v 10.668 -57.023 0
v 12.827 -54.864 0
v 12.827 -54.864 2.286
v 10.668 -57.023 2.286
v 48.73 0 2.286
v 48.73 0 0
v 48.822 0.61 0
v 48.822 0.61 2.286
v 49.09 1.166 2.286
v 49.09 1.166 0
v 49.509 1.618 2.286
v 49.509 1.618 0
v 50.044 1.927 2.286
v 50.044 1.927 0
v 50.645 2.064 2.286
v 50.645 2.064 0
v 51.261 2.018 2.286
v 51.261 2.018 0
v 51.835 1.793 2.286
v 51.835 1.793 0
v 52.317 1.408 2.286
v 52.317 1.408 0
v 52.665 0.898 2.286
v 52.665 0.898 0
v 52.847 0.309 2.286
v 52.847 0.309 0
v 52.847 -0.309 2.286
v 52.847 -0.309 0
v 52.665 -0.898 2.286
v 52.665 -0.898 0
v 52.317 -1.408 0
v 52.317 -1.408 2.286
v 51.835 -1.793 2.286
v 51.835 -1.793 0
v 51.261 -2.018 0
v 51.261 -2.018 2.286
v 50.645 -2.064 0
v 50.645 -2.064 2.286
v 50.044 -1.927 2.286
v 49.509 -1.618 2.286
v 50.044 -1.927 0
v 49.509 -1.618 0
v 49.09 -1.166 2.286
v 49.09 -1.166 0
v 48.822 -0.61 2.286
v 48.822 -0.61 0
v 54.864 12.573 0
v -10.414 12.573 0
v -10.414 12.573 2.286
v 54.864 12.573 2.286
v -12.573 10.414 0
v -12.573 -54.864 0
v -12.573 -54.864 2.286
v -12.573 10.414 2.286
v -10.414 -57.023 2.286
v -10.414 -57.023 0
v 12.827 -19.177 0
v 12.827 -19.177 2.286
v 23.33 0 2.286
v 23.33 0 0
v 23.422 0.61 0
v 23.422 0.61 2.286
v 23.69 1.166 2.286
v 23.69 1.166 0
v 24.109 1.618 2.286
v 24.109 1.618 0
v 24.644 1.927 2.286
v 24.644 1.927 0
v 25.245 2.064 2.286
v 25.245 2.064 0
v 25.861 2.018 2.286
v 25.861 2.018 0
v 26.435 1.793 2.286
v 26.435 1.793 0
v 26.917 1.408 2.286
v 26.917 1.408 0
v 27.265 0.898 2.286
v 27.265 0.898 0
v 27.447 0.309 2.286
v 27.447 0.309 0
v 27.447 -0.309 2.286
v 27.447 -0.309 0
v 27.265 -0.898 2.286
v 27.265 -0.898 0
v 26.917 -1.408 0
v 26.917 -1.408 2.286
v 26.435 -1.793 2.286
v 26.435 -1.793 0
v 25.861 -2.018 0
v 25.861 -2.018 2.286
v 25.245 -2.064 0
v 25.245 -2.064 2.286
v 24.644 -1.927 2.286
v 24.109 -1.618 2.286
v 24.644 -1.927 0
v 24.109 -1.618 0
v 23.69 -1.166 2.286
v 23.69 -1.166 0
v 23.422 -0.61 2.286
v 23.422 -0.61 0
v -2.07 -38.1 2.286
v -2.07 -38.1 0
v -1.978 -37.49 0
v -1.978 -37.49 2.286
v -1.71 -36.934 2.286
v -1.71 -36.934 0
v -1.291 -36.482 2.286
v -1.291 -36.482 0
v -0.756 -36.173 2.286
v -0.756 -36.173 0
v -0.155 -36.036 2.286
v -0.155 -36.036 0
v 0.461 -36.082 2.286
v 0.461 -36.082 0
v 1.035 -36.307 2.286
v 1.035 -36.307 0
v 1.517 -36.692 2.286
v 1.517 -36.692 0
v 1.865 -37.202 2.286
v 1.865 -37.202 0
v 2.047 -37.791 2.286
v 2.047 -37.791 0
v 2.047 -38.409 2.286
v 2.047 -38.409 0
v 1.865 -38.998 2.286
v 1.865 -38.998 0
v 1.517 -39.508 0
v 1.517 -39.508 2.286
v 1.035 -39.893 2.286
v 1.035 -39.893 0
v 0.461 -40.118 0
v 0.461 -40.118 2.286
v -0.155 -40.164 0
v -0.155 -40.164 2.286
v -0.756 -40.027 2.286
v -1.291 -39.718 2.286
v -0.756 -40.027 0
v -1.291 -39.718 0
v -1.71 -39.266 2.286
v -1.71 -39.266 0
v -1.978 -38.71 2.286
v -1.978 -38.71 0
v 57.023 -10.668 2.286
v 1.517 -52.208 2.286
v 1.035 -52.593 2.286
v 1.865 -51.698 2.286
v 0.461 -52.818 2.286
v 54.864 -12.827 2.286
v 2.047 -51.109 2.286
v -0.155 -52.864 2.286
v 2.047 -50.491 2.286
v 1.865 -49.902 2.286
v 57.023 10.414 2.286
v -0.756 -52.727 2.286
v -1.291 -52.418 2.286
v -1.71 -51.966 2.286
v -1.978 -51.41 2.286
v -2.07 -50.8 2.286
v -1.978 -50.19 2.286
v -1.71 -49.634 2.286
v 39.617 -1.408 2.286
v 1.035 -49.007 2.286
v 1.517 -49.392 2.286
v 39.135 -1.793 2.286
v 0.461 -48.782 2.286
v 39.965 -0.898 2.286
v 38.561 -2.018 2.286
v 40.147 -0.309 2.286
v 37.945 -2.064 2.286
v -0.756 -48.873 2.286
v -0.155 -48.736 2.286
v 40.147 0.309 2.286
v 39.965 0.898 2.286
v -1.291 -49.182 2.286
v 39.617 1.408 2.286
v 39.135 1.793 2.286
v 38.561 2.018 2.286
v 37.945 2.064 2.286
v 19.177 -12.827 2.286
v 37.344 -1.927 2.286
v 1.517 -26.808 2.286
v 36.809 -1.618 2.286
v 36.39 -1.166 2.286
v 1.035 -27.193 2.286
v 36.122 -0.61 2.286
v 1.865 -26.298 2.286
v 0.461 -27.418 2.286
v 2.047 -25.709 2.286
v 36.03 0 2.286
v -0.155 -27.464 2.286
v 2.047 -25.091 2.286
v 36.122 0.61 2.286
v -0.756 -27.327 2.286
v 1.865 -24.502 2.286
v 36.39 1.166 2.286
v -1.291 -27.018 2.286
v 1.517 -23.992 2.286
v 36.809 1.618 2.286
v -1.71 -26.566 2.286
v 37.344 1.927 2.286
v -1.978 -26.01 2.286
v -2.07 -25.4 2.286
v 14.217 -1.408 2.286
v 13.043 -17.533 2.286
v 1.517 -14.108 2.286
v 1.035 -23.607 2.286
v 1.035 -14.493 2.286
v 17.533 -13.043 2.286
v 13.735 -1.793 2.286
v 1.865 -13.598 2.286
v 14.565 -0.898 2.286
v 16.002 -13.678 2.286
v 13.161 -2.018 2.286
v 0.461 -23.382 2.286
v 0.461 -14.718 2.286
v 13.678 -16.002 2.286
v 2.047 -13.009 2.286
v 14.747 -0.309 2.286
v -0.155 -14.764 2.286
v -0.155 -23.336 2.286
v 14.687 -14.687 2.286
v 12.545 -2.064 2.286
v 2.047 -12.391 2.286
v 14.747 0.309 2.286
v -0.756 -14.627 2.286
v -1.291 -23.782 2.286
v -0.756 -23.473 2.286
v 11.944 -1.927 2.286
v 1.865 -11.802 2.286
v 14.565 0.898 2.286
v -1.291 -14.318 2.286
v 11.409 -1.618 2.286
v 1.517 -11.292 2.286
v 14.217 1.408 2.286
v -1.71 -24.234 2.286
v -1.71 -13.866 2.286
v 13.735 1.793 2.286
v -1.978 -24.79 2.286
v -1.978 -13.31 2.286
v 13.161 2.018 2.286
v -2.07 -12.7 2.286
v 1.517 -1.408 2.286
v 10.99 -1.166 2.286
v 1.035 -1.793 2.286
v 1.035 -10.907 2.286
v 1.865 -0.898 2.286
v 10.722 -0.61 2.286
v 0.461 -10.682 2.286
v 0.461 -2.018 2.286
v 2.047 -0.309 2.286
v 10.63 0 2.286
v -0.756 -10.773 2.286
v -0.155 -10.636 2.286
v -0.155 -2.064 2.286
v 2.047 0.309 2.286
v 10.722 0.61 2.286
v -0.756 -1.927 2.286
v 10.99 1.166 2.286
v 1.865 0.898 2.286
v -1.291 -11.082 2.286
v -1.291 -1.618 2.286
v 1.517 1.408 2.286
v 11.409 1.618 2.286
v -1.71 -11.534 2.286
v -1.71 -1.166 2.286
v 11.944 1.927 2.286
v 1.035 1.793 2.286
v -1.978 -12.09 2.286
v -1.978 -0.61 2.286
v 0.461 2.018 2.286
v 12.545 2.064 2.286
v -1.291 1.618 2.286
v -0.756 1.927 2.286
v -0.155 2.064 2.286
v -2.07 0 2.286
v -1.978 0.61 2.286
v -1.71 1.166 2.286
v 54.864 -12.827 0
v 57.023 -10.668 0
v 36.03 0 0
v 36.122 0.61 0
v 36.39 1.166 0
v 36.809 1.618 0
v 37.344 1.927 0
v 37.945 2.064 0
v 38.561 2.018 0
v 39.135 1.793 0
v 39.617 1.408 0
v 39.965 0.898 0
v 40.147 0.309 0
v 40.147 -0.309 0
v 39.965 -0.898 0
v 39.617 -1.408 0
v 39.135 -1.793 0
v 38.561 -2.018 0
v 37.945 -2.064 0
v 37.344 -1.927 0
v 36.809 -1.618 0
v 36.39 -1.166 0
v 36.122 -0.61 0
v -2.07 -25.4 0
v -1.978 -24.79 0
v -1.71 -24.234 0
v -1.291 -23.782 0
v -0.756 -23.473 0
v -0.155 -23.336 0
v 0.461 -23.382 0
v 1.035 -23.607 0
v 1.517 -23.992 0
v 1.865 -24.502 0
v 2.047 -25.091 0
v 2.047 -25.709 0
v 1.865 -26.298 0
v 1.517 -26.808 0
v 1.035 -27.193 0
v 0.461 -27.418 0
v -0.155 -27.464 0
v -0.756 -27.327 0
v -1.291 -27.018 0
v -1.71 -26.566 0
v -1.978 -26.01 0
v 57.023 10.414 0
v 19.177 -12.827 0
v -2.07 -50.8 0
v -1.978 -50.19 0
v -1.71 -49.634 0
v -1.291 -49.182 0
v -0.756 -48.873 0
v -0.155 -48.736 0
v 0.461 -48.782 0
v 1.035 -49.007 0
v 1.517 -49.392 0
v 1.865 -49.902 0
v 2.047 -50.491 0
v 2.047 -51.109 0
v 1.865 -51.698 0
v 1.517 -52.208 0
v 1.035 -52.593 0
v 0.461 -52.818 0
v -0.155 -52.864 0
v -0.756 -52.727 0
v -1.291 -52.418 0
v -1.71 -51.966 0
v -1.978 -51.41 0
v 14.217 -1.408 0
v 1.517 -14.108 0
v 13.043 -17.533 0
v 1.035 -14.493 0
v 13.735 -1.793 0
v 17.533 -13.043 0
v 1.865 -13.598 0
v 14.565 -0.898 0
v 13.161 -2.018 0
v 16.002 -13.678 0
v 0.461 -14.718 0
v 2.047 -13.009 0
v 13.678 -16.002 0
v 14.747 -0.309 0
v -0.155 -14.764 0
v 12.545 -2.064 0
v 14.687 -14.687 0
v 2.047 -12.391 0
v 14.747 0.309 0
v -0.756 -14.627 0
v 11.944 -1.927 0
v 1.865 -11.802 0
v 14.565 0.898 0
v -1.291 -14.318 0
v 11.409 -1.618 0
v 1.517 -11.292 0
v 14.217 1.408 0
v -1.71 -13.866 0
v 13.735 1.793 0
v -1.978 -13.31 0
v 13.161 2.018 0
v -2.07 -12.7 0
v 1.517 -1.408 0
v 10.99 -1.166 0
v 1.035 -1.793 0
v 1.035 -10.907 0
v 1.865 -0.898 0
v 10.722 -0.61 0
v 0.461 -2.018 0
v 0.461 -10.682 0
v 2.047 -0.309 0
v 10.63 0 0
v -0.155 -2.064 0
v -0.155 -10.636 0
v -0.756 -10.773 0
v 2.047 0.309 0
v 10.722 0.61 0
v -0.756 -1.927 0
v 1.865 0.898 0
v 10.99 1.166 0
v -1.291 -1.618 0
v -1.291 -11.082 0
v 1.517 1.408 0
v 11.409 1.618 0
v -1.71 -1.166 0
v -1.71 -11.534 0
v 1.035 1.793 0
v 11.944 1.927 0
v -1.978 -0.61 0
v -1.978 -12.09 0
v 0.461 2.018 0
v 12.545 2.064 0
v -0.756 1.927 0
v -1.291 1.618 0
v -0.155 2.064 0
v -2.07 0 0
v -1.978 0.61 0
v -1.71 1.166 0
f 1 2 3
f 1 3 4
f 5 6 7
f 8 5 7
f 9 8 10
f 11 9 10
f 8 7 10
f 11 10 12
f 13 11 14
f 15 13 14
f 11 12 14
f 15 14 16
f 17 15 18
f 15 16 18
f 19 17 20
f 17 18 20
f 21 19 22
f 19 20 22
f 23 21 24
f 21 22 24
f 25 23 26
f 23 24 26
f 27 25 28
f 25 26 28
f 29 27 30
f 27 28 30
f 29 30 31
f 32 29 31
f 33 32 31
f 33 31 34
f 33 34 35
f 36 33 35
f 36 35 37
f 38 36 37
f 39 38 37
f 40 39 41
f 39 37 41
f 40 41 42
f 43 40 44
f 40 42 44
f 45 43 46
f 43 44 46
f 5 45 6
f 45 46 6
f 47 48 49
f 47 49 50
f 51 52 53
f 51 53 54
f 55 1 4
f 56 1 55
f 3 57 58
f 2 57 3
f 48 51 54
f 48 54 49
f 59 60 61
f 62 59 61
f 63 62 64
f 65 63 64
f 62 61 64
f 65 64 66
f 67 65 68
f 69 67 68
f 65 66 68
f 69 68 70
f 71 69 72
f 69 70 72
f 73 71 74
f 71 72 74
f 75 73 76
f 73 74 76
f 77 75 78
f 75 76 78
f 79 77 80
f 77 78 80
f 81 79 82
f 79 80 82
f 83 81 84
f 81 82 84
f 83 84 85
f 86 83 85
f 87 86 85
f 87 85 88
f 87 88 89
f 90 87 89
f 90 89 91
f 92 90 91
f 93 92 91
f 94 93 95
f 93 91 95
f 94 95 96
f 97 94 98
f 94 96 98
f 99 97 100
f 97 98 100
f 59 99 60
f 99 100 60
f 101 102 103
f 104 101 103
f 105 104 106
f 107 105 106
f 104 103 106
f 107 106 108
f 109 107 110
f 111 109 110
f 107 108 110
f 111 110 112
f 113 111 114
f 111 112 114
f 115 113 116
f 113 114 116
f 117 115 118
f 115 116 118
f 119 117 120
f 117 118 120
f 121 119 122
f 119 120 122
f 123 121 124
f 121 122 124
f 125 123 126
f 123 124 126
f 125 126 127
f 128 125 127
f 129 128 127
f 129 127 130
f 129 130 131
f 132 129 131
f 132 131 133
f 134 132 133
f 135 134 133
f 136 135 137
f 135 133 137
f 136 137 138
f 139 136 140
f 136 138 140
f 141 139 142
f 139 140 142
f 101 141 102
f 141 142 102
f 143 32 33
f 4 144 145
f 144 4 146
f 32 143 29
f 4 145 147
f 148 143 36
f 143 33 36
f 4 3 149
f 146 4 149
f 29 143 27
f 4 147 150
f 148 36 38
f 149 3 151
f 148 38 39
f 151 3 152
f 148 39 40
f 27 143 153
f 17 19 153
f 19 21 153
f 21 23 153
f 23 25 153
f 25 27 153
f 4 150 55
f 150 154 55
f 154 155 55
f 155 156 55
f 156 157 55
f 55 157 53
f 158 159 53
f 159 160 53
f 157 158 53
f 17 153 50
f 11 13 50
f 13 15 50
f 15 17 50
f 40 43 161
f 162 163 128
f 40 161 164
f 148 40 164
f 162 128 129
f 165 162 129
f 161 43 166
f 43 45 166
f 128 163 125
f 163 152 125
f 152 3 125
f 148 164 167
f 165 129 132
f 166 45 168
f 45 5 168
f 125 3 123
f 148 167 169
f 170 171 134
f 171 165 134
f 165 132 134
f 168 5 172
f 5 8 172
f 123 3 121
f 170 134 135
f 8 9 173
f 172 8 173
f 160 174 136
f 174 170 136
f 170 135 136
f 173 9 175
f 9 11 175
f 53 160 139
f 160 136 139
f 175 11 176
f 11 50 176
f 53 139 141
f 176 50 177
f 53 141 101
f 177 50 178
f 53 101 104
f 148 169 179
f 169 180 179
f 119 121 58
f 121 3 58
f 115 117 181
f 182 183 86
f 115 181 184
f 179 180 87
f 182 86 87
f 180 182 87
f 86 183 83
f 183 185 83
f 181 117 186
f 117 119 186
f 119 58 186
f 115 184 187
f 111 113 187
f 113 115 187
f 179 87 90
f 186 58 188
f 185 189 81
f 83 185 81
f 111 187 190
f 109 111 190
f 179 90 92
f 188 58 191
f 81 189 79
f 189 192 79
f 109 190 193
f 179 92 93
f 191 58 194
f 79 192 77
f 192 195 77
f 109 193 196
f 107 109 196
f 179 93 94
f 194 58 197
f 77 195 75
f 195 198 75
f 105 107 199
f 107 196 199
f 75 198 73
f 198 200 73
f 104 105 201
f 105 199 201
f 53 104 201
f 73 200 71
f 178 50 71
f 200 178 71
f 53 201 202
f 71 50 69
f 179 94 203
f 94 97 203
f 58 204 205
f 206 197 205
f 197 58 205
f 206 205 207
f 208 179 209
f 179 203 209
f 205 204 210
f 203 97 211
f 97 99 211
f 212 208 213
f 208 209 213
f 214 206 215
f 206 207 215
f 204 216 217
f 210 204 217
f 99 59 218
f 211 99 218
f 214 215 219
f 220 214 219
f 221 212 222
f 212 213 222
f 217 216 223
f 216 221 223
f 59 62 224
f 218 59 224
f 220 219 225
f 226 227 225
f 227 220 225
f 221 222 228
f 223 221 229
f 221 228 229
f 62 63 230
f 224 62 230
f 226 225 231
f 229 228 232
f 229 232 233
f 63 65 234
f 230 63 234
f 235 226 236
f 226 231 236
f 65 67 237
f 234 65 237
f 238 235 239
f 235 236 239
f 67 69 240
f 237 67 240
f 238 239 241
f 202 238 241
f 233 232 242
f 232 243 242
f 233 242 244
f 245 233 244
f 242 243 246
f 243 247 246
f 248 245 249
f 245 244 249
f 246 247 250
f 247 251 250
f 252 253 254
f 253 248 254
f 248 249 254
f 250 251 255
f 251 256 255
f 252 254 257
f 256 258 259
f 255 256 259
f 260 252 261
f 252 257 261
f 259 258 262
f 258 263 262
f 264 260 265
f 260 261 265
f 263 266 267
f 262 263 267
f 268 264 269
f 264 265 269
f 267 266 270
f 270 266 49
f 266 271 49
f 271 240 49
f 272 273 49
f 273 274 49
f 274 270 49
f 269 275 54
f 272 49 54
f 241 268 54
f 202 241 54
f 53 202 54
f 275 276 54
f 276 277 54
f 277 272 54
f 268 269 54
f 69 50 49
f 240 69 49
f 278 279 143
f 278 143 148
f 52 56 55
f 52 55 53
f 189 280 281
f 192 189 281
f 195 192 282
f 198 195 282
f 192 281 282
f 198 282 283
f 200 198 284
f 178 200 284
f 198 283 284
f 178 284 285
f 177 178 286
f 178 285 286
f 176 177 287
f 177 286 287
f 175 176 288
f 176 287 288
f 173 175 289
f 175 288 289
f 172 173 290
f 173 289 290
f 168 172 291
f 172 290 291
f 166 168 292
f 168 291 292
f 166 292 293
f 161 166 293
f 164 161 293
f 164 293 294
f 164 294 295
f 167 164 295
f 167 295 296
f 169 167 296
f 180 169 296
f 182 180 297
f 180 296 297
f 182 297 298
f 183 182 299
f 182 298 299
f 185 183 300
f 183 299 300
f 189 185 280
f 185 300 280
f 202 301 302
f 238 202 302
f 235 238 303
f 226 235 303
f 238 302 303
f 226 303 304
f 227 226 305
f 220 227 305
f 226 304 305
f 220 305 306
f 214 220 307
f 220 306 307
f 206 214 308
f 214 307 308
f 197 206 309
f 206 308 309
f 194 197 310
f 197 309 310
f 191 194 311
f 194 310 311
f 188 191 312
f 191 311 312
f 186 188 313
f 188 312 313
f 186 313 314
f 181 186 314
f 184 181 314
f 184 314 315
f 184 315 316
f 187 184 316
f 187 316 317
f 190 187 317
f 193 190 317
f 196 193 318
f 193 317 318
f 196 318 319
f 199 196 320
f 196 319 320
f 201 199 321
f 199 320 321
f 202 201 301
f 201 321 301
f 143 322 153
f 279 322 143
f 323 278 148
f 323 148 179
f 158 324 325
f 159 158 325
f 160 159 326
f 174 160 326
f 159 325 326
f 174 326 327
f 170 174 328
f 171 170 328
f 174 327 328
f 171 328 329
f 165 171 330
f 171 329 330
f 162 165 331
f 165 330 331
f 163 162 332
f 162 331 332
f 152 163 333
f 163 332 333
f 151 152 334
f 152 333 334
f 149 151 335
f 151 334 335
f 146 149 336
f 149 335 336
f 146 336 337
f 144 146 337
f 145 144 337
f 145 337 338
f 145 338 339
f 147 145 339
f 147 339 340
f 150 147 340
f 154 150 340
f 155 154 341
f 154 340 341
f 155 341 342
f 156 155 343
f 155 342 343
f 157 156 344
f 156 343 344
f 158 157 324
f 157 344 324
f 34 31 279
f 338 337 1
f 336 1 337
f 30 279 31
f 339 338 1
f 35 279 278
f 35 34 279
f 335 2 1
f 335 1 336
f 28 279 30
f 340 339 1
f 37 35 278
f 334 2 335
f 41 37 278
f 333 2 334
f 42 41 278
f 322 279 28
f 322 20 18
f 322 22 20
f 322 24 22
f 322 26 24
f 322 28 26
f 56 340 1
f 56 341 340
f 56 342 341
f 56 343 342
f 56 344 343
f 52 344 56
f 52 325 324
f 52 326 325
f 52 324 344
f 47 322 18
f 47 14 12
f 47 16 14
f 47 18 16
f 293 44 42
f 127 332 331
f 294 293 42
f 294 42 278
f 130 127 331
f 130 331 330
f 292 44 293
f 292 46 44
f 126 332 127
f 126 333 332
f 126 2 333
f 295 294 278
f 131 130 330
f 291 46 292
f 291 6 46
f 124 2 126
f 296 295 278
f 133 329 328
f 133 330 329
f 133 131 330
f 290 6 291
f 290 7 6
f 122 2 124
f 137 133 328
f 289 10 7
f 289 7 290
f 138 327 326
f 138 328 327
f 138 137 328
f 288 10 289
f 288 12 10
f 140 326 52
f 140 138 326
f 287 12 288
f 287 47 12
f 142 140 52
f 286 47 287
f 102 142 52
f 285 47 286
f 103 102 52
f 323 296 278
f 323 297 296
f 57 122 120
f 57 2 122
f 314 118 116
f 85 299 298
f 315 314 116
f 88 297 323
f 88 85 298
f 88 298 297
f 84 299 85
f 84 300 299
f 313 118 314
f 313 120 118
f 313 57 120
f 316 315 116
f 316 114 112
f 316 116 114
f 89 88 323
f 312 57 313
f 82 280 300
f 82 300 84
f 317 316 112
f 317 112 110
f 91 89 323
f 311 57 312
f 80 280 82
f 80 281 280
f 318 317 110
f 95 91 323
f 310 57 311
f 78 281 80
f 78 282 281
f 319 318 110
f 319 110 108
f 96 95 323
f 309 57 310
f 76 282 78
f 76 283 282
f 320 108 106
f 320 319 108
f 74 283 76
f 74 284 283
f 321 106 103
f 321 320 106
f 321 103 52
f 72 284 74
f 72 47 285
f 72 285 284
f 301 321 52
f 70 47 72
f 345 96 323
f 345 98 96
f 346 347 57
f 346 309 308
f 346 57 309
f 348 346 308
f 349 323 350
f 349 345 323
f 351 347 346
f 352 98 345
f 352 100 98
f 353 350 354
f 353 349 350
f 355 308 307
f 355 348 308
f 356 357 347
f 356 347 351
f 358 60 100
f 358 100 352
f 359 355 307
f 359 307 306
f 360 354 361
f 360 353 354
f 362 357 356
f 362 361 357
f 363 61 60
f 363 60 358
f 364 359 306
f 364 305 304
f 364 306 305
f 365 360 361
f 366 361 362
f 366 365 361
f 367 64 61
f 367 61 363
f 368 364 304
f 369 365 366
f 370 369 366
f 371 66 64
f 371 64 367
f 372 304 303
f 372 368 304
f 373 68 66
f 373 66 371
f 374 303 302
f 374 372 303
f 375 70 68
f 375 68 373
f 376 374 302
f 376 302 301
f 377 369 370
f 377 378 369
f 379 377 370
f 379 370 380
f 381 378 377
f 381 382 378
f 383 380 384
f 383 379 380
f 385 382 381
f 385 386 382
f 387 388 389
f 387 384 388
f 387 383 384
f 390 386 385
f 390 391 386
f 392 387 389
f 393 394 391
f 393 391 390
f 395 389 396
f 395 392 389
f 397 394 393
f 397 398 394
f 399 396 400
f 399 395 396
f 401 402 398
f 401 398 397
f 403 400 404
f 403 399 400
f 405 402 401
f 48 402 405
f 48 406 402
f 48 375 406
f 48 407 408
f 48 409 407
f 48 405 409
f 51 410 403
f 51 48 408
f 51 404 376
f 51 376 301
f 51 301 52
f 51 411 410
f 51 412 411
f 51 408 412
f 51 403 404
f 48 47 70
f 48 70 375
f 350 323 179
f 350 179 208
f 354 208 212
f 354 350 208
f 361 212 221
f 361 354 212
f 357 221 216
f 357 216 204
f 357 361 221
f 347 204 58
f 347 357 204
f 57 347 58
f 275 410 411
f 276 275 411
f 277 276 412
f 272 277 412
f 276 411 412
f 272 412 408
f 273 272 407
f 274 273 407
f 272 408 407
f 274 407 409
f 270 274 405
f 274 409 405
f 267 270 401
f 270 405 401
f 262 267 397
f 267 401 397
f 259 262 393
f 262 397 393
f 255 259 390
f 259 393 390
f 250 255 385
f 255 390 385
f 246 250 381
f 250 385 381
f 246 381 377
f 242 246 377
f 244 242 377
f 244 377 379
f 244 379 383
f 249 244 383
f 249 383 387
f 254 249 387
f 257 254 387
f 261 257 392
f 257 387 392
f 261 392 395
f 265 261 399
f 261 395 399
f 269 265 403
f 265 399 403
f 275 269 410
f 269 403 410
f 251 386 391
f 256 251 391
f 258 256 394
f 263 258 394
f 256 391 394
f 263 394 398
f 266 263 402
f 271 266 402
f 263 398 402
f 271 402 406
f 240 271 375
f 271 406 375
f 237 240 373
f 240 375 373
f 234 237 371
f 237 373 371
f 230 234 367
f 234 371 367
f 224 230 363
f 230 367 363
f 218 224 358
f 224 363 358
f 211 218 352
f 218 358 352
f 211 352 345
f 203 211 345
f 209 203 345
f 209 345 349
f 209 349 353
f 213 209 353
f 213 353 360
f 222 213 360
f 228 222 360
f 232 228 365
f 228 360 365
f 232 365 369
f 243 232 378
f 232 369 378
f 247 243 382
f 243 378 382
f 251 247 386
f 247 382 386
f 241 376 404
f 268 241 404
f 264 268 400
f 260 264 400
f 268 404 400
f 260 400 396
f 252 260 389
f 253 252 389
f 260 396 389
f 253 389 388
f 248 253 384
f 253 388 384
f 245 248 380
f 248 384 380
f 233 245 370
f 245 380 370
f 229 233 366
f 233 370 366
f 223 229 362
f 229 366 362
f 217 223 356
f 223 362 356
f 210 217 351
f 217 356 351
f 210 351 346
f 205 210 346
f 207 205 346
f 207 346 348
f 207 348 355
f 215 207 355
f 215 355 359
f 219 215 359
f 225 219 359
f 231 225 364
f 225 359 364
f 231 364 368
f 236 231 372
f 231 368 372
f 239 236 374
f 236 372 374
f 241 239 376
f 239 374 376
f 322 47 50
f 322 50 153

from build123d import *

# Parameters (mm, degrees)
SKETCH1_R           = 2.0701
BOSS_EXTRUDE1_DEPTH = 2.286


with BuildPart() as part:
    # Sketch1 → Boss-Extrude1 (new body)
    with BuildSketch(Plane(origin=(0, 0, 0), x_dir=(-1, 0, 0), z_dir=(0, 0, -1))):
        with BuildLine():
            Line((10.414, 12.573), (-54.864, 12.573))
            Line((-54.864, 12.573), (-57.023, 10.414))
            Line((-57.023, 10.414), (-57.023, -10.668))
            Line((-57.023, -10.668), (-54.864, -12.827))
            Line((-54.864, -12.827), (-19.177, -12.827))
            ThreePointArc((-19.177, -12.827), (-14.686871939, -14.686871939), (-12.827, -19.177))
            Line((-12.827, -19.177), (-12.827, -54.864))
            Line((-12.827, -54.864), (-10.668, -57.023))
            Line((-10.668, -57.023), (10.414, -57.023))
            Line((10.414, -57.023), (12.573, -54.864))
            Line((12.573, -54.864), (12.573, 10.414))
            Line((12.573, 10.414), (10.414, 12.573))
        make_face()
        with Locations((0, -50.8)):
            Circle(SKETCH1_R, mode=Mode.SUBTRACT)
        with Locations((0, -25.4)):
            Circle(SKETCH1_R, mode=Mode.SUBTRACT)
        with Locations((-38.1, 0)):
            Circle(SKETCH1_R, mode=Mode.SUBTRACT)
        with Locations((-12.7, 0)):
            Circle(SKETCH1_R, mode=Mode.SUBTRACT)
        Circle(SKETCH1_R, mode=Mode.SUBTRACT)
        with Locations((-25.4, 0)):
            Circle(SKETCH1_R, mode=Mode.SUBTRACT)
        with Locations((0, -12.7)):
            Circle(SKETCH1_R, mode=Mode.SUBTRACT)
        with Locations((0, -38.1)):
            Circle(SKETCH1_R, mode=Mode.SUBTRACT)
        with Locations((-50.8, 0)):
            Circle(SKETCH1_R, mode=Mode.SUBTRACT)
    extrude(amount=-BOSS_EXTRUDE1_DEPTH)


solid = part.part
